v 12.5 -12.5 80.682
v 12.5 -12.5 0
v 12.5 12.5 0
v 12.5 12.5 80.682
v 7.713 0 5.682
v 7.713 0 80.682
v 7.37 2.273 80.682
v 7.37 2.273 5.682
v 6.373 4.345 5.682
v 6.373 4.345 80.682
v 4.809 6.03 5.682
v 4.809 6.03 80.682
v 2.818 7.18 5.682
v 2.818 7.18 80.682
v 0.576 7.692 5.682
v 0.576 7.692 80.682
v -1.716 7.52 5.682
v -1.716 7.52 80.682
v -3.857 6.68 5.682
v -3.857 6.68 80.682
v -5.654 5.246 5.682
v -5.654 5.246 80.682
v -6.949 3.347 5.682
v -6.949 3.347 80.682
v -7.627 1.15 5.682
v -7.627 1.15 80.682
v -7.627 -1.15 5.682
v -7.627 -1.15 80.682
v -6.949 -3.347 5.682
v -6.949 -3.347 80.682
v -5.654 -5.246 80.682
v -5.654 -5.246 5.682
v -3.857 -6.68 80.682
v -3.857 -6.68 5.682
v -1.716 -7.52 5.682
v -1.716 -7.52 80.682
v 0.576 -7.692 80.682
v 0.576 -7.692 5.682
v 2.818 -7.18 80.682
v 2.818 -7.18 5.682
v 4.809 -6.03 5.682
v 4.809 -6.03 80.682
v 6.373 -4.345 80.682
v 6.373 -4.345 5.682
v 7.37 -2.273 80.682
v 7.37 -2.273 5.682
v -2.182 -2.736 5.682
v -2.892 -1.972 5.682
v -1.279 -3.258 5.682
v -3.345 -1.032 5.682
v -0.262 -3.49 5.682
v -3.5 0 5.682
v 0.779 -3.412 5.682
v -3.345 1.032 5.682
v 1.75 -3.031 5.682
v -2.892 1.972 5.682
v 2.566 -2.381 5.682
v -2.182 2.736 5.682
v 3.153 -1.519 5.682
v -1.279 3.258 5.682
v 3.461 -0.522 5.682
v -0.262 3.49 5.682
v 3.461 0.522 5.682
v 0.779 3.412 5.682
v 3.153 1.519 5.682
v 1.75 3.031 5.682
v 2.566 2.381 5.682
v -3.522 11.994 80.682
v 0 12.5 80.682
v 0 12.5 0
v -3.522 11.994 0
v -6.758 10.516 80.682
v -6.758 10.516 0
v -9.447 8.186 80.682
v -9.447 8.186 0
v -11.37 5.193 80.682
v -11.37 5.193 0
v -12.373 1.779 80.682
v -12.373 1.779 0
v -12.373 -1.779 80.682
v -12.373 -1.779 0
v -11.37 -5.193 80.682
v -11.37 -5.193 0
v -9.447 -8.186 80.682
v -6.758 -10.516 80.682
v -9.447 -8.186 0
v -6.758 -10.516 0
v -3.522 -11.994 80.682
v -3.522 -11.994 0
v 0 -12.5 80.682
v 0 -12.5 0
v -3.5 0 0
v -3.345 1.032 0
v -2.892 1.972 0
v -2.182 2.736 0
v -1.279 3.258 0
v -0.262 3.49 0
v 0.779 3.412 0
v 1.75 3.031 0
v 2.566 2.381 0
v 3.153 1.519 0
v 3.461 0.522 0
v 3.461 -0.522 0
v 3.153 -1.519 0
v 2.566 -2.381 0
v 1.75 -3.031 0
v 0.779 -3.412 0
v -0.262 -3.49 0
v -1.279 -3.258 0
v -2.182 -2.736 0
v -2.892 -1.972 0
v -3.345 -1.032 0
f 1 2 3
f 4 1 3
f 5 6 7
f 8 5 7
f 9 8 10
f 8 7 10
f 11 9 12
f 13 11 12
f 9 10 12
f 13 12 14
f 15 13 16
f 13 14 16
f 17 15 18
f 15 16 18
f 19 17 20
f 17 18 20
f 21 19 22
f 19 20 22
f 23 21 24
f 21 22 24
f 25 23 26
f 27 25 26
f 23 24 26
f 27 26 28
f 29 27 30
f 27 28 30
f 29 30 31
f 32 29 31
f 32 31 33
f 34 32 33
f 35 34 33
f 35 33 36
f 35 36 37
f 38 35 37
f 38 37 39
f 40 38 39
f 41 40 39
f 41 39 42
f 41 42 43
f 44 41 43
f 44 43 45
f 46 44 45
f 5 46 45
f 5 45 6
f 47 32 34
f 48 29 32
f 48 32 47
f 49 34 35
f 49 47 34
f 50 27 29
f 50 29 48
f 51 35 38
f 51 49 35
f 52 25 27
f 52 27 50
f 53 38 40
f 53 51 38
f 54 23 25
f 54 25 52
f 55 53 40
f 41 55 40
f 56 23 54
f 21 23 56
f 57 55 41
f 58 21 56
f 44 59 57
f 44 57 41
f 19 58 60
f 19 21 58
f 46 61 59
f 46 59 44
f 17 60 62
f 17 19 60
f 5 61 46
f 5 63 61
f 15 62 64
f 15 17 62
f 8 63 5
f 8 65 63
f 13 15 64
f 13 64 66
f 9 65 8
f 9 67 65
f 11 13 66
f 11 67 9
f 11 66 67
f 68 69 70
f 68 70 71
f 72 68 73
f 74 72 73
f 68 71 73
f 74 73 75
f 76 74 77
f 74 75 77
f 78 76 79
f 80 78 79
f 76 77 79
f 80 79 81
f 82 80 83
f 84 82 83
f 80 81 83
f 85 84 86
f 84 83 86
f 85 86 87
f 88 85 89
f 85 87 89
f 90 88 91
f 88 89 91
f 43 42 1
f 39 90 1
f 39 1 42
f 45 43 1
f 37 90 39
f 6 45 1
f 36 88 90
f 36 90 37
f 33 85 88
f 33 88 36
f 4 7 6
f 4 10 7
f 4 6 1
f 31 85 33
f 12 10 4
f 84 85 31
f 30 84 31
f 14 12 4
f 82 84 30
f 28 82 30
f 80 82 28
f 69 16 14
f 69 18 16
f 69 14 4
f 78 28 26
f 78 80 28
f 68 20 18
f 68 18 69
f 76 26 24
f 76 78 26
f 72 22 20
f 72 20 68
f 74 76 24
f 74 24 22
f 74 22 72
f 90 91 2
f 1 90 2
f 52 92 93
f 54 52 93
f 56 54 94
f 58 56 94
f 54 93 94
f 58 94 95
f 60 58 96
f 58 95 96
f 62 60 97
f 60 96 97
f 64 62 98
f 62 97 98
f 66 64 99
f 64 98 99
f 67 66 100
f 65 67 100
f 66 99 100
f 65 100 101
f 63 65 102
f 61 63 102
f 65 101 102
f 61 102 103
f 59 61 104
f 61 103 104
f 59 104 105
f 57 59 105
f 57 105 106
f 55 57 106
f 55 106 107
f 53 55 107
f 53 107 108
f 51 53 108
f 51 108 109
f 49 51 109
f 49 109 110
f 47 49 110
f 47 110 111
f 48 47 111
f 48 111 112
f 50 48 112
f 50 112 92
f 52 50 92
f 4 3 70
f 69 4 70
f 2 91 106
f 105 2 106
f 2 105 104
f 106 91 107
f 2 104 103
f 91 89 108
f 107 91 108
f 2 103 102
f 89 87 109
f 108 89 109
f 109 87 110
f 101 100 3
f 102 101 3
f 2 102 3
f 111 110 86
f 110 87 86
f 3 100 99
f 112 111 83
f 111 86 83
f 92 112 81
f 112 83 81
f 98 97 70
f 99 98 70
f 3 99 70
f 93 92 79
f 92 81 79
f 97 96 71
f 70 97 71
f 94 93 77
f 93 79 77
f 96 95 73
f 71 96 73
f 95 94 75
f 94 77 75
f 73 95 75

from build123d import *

# Parameters (mm, degrees)
BOSS_EXTRUDE5_DEPTH = 80.682375276
SKETCH6_R           = 7.713097058
CUT_EXTRUDE3_DEPTH  = 25
SKETCH7_R           = 3.5
CUT_EXTRUDE4_DEPTH  = 5
SKETCH8_R           = 7.713097058
CUT_EXTRUDE5_DEPTH  = 50
SKETCH9_R           = 3.5
CUT_EXTRUDE6_DEPTH  = 50


with BuildPart() as part:
    # Sketch3 → Boss-Extrude5 (new body)
    with BuildSketch(Plane(origin=(0, 0, 0), x_dir=(0, 1, 0), z_dir=(0, 0, 1))):
        with BuildLine():
            Line((-12.5, 0), (-12.5, -12.5))
            Line((-12.5, -12.5), (12.5, -12.5))
            Line((12.5, -12.5), (12.5, 0))
            ThreePointArc((12.5, 0), (0, 12.5), (-12.5, 0))
        make_face()
    extrude(amount=BOSS_EXTRUDE5_DEPTH)

    # Sketch6 → Cut-Extrude3 (cut)
    with BuildSketch(Plane.XY.offset(80.682375276)):
        Circle(SKETCH6_R)
    extrude(amount=-CUT_EXTRUDE3_DEPTH, mode=Mode.SUBTRACT)

    # Sketch7 → Cut-Extrude4 (cut)
    with BuildSketch(Plane(origin=(0, 0, 0), x_dir=(1, 0, 0), z_dir=(0, 0, -1))):
        with Locations(Location((0, 0, 0), (0, 0, 180))):
            Circle(SKETCH7_R)
    extrude(amount=-CUT_EXTRUDE4_DEPTH, mode=Mode.SUBTRACT)

    # Sketch8 → Cut-Extrude5 (cut)
    with BuildSketch(Plane.XY.offset(55.682375276)):
        Circle(SKETCH8_R)
    extrude(amount=-CUT_EXTRUDE5_DEPTH, mode=Mode.SUBTRACT)

    # Sketch9 → Cut-Extrude6 (cut)
    with BuildSketch(Plane(origin=(0, 0, 0), x_dir=(1, 0, 0), z_dir=(0, 0, -1))):
        with Locations(Location((0, 0, 0), (0, 0, 180))):
            Circle(SKETCH9_R)
    extrude(amount=-CUT_EXTRUDE6_DEPTH, mode=Mode.SUBTRACT)


solid = part.part
